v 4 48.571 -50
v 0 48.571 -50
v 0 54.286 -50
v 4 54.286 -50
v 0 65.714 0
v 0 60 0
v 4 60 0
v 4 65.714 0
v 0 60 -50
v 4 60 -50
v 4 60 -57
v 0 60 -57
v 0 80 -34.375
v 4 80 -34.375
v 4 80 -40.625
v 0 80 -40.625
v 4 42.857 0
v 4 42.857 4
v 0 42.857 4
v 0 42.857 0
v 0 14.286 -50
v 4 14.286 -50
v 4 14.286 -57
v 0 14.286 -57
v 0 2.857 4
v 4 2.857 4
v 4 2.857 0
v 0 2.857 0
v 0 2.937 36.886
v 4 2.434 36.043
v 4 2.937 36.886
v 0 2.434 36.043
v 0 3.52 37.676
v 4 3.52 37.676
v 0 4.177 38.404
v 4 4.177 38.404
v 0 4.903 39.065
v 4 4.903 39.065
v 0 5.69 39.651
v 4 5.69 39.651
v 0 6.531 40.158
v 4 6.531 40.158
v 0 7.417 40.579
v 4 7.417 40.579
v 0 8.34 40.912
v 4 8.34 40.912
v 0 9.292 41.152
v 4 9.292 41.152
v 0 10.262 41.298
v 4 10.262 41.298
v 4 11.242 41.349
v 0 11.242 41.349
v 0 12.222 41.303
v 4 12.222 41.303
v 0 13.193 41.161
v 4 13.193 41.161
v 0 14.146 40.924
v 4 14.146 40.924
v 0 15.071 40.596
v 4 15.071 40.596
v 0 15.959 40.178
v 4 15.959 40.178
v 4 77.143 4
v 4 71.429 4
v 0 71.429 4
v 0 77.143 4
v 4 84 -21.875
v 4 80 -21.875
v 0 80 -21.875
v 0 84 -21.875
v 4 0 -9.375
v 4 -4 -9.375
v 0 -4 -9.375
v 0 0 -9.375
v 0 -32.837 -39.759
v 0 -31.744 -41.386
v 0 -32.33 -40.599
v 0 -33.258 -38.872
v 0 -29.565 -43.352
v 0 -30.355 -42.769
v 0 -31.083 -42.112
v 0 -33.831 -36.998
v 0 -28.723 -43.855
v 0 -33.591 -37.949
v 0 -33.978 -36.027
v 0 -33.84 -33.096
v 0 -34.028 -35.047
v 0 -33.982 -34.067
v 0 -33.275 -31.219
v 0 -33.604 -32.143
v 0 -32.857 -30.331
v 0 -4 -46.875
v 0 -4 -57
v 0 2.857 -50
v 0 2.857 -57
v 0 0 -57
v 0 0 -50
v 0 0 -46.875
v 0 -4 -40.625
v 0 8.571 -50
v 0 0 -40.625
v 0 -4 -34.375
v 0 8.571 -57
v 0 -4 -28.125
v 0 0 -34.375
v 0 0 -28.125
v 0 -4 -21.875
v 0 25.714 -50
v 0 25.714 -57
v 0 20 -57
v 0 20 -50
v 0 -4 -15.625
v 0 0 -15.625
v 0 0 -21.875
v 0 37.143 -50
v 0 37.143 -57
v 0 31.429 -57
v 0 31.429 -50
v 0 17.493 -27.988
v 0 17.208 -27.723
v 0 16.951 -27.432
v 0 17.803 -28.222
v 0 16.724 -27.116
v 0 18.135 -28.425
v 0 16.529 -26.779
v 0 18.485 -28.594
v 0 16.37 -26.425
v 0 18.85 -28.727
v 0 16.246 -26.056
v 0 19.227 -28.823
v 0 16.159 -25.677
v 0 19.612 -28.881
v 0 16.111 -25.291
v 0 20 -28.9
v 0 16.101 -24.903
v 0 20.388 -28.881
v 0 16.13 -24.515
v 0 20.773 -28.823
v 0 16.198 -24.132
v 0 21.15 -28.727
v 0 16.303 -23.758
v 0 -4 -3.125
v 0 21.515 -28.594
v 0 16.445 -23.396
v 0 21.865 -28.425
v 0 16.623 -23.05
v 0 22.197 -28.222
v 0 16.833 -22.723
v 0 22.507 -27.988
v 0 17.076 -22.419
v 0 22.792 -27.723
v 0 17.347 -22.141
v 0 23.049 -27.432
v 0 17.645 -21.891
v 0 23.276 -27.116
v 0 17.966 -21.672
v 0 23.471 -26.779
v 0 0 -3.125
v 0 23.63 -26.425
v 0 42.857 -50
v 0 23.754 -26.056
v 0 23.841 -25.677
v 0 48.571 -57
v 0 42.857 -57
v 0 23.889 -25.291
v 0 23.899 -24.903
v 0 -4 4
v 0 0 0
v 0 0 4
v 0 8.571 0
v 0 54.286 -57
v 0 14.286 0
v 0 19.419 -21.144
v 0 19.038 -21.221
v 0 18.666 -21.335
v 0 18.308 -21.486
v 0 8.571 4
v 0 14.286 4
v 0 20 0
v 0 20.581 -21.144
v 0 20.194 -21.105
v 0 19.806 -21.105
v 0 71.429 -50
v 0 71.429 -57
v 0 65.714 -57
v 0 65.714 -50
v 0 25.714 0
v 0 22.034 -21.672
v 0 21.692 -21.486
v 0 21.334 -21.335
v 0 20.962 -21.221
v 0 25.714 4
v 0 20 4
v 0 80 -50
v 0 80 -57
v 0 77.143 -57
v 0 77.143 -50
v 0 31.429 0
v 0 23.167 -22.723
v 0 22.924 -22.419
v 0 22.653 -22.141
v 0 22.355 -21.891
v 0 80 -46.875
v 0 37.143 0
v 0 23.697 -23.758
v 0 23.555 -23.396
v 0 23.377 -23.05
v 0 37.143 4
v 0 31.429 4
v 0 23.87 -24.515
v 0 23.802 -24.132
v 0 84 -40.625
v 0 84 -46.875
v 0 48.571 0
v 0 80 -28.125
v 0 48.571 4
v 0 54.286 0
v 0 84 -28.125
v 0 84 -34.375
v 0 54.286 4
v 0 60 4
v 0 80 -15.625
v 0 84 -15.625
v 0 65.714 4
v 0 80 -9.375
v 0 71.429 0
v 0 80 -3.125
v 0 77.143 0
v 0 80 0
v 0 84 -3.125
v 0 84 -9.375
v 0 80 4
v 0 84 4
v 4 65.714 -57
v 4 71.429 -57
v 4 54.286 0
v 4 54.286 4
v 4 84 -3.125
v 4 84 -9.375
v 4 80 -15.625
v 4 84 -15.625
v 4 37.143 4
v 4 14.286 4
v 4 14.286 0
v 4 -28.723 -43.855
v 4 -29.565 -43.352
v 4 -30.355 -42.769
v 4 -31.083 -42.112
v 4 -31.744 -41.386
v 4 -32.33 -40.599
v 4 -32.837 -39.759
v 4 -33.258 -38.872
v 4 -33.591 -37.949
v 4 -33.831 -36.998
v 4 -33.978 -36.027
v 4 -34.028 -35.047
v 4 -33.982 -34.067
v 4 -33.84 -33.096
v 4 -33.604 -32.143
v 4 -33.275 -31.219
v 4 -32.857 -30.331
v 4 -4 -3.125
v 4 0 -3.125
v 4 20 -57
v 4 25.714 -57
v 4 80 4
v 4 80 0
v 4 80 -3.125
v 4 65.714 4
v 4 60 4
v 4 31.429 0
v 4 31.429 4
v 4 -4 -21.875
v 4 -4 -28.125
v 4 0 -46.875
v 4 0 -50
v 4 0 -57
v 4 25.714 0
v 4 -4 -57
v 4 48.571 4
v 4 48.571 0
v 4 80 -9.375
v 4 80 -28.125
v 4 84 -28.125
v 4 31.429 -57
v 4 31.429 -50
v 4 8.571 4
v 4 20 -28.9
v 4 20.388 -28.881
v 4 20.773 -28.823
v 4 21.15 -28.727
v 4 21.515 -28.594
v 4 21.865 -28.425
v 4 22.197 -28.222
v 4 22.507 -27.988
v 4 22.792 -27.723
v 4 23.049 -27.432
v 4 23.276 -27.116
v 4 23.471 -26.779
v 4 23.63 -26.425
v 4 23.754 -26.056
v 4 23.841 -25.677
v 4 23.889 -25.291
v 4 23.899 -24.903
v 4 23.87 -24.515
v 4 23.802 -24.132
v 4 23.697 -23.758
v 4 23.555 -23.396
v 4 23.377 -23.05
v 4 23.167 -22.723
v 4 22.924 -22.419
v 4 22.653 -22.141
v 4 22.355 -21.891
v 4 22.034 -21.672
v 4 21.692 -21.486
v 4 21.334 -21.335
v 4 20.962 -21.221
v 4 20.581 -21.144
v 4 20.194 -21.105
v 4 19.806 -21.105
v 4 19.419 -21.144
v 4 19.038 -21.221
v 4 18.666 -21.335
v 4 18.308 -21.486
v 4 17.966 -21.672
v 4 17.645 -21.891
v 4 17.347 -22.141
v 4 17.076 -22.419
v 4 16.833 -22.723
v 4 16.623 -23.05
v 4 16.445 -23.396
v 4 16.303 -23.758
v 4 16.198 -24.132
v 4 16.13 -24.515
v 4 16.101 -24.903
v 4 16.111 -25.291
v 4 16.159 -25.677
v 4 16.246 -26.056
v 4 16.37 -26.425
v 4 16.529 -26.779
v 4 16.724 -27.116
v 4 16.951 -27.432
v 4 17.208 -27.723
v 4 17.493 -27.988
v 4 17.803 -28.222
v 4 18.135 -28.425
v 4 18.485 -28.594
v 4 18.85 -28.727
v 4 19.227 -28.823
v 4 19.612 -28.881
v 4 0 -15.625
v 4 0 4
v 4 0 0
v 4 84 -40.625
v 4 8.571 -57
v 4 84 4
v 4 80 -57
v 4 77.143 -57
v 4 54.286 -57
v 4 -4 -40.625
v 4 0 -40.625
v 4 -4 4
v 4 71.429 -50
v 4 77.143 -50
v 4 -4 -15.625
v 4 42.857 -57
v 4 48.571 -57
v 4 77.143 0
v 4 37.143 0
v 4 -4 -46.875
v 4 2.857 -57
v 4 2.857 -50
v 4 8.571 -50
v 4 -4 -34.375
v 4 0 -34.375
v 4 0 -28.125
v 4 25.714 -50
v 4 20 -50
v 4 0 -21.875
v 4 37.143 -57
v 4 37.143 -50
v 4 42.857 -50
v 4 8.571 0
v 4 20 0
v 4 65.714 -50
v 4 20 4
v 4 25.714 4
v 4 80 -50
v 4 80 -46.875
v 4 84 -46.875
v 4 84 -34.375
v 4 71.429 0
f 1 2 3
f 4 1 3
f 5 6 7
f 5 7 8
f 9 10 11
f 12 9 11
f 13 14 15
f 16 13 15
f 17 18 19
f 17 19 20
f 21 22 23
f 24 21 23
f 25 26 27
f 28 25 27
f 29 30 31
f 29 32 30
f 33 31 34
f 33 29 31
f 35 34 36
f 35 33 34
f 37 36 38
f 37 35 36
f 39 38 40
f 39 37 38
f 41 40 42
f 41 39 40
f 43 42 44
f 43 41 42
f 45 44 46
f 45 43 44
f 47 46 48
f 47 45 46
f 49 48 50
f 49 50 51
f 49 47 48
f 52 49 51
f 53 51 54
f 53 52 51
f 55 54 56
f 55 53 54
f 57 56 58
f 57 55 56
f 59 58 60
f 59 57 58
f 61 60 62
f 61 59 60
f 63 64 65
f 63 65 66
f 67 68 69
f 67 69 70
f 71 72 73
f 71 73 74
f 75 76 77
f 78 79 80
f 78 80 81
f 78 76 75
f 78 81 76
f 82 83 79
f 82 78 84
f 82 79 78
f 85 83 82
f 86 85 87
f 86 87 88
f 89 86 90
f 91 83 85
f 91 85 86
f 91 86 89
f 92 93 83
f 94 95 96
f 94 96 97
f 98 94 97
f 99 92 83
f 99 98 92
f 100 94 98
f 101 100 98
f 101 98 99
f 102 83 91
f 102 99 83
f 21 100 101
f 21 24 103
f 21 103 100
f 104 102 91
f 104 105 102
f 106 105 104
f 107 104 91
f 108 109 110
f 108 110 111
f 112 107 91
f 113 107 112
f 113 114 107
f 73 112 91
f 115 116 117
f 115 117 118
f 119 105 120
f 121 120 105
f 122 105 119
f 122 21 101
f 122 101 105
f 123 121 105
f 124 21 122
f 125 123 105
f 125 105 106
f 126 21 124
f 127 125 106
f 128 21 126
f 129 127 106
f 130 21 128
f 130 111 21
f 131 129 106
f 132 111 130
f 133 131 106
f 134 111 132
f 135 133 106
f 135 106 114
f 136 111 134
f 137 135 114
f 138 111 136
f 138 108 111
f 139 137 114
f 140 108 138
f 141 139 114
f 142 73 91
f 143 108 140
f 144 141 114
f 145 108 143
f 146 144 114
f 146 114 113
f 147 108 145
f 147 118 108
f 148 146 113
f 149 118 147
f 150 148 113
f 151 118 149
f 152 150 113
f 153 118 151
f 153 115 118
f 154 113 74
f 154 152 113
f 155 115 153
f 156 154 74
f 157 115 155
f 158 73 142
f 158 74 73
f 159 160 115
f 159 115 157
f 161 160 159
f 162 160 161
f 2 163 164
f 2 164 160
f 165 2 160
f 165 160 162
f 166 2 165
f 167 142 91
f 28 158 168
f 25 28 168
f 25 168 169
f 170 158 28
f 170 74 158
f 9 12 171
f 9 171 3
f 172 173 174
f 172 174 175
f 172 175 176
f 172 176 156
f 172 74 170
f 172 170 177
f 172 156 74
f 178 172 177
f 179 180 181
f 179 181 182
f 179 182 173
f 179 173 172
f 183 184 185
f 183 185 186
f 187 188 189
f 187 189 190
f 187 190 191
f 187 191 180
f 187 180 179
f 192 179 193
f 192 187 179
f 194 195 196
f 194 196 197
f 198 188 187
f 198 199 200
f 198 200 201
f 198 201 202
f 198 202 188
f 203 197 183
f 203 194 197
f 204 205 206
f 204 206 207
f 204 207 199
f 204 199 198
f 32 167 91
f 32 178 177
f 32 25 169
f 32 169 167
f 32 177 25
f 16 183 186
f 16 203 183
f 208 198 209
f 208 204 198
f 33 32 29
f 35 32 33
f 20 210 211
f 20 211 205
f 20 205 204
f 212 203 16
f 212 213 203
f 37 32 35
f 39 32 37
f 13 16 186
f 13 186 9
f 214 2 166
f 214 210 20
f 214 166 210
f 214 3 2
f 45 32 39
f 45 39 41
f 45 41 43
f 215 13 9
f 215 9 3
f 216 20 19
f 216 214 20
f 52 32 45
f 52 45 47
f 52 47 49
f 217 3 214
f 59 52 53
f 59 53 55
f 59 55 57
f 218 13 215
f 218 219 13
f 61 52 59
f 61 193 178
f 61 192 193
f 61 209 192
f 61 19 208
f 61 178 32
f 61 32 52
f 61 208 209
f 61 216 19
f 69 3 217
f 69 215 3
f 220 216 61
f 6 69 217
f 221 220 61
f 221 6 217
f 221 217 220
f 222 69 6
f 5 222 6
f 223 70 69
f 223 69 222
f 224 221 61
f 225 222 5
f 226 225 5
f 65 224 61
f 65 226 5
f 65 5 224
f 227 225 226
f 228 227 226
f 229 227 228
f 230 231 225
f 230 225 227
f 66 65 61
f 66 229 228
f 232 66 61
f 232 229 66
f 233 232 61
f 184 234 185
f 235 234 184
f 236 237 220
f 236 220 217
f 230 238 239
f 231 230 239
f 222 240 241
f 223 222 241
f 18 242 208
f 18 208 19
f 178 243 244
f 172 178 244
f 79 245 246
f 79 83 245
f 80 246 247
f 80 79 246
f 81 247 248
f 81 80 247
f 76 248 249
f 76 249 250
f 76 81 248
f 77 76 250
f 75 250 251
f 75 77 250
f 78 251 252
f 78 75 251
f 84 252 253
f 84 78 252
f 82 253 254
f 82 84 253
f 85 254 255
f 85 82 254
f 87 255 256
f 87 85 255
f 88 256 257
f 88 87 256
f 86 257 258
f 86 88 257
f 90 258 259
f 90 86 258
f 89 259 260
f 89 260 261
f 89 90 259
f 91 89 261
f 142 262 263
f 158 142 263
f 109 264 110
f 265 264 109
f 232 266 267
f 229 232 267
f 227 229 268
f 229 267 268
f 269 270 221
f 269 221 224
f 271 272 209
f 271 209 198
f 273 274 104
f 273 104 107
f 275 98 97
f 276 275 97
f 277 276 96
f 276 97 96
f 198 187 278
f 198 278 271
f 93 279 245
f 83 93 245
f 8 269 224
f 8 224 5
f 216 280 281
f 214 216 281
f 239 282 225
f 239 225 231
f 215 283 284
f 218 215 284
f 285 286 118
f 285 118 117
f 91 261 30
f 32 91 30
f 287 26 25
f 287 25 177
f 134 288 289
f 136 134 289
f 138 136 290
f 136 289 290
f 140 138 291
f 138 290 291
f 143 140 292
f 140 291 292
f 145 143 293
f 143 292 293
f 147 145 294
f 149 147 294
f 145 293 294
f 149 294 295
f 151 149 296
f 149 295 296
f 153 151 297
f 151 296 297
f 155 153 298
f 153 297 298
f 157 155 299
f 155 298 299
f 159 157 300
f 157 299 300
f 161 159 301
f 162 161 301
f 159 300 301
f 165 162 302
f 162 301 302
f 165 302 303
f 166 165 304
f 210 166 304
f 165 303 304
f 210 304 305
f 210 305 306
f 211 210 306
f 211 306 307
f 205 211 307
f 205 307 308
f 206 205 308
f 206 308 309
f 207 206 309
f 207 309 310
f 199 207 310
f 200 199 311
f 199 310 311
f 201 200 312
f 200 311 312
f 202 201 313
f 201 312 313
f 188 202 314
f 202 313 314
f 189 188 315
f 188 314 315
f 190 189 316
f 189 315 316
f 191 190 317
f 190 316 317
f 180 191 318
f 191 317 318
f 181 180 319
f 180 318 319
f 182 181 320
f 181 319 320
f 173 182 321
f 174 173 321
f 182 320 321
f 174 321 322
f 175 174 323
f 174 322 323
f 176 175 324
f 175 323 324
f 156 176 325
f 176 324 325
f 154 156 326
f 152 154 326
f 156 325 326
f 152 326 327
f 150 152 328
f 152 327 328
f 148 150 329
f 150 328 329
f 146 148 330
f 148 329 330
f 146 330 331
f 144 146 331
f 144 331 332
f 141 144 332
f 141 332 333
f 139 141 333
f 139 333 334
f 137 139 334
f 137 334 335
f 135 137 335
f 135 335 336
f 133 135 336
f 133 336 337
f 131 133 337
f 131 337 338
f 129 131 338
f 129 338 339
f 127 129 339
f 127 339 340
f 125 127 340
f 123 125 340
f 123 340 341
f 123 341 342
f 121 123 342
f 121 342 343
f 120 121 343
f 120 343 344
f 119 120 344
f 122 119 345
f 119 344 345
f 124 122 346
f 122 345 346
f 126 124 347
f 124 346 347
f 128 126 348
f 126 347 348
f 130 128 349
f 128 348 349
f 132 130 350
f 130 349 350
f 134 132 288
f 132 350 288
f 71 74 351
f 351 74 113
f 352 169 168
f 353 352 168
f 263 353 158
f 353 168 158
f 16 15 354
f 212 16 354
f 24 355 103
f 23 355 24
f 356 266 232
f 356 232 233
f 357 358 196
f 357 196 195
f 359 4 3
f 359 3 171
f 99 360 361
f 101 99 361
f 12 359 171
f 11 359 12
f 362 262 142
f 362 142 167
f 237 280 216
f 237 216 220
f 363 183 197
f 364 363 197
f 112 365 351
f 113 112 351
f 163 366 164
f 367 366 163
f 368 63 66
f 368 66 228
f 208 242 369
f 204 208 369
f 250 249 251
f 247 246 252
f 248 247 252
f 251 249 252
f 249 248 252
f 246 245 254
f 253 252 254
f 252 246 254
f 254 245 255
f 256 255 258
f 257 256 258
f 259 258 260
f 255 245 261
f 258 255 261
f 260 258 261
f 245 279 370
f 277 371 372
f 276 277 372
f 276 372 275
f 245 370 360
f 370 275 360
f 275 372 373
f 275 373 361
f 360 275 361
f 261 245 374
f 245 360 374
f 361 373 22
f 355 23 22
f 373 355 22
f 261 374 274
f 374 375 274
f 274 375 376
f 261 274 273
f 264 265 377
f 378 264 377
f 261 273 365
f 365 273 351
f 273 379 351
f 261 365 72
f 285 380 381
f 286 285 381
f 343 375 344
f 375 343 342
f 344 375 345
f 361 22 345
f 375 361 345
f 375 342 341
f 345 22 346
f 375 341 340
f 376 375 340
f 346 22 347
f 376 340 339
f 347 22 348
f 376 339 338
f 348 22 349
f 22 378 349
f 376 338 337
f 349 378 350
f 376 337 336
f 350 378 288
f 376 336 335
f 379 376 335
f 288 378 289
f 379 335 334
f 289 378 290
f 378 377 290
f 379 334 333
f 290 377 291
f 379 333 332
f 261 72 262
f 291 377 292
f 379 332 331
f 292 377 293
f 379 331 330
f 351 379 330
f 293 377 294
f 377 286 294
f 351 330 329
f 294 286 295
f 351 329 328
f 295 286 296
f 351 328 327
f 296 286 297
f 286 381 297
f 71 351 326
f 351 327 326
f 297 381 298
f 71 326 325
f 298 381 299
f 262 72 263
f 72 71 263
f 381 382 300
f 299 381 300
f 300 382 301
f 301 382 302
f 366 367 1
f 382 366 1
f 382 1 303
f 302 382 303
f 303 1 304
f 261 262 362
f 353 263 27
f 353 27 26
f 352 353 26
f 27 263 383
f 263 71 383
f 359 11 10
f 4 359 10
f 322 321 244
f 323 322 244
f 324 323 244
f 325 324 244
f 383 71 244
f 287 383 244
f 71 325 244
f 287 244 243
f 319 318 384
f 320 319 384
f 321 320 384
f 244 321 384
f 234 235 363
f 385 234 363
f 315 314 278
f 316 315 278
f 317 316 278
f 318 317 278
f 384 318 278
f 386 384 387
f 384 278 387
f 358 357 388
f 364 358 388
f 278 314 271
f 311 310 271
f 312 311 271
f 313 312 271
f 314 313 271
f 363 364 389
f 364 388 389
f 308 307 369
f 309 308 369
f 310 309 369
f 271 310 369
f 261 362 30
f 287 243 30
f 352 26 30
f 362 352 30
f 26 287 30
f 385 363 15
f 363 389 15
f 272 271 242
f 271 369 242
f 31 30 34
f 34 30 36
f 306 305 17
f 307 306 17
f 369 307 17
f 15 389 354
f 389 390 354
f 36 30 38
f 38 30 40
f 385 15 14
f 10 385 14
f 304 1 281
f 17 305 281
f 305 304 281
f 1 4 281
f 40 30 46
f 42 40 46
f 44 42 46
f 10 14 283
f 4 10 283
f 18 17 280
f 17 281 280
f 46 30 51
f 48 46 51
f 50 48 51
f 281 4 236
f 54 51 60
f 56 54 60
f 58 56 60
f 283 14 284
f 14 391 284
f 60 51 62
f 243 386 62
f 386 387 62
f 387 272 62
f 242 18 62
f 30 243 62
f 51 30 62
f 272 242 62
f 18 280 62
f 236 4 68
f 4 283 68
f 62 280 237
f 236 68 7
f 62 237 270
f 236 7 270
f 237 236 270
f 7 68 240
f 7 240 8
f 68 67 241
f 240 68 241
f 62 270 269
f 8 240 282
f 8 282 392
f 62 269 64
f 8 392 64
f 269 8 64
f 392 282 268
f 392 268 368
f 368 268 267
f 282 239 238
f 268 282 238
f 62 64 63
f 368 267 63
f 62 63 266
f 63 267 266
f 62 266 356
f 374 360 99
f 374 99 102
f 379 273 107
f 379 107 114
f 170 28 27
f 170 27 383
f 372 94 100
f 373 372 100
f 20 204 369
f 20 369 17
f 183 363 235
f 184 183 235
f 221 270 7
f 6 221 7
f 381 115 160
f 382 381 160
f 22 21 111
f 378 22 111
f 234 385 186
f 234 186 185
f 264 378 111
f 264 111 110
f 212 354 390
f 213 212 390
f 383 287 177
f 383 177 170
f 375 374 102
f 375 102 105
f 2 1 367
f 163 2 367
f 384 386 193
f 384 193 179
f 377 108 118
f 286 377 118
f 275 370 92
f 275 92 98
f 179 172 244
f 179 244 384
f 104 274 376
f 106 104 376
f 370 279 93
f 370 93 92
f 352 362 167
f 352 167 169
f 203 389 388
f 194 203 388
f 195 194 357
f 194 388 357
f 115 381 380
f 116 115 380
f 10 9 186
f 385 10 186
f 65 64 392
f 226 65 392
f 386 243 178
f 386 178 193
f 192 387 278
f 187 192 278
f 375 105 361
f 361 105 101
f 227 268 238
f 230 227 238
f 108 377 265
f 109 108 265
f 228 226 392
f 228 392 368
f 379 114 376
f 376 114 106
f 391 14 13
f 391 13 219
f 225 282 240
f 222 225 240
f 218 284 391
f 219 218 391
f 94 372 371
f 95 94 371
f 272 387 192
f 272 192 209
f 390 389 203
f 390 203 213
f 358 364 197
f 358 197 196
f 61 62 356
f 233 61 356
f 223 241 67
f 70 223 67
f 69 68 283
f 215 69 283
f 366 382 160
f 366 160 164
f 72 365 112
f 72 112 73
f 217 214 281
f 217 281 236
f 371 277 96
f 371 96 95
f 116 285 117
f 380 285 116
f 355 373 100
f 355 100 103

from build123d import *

# Parameters (mm, degrees)
SCHIZZO1_W                   = 50
SCHIZZO1_H                   = 80
ESTRUSIONE_ESTRUSIONE1_DEPTH = 4
SCHIZZO2_W                   = 4
SCHIZZO2_H                   = 2.857142857
SCHIZZO2_W_2                 = 7
ESTRUSIONE_ESTRUSIONE2_DEPTH = 4
SCHIZZO3_W                   = 4
SCHIZZO3_H                   = 5.714285715
SCHIZZO3_W_2                 = 7
ESTRUSIONE_ESTRUSIONE3_DEPTH = 4
RIPETIZIONE_A_L1_COUNT       = 6
RIPETIZIONE_A_L1_PITCH       = 11.428571
SCHIZZO4_W                   = 6.25
SCHIZZO4_H                   = 4
ESTRUSIONE_ESTRUSIONE4_DEPTH = 4
RIPETIZIONE_A_L2_COUNT       = 4
RIPETIZIONE_A_L2_PITCH       = 12.5
ESTRUSIONE_ESTRUSIONE5_DEPTH = 4
RACCORDO1_R                  = 10
SCHIZZO6_R                   = 3.9
TAGLIO_ESTRUSIONE1_DEPTH     = 4


with BuildPart() as part:
    # Schizzo1 → Estrusione-Estrusione1 (new body)
    with BuildSketch(Plane(origin=(0, 0, 0), x_dir=(0, 0, -1), z_dir=(1, 0, 0))):
        with Locations((25, 40)):
            Rectangle(SCHIZZO1_W, SCHIZZO1_H)
    extrude(amount=ESTRUSIONE_ESTRUSIONE1_DEPTH)

    # Schizzo2 → Estrusione-Estrusione2 (add)
    with BuildSketch(Plane(origin=(4, 0, 0), x_dir=(0, 0, -1), z_dir=(1, 0, 0))):
        with Locations((-2, 78.571428572)):
            Rectangle(SCHIZZO2_W, SCHIZZO2_H)
        with Locations((53.5, 78.571428572)):
            Rectangle(SCHIZZO2_W_2, SCHIZZO2_H)
        with Locations((53.5, 1.428571429)):
            Rectangle(SCHIZZO2_W_2, SCHIZZO2_H)
        with Locations((-2, 1.428571429)):
            Rectangle(SCHIZZO2_W, SCHIZZO2_H)
    extrude(amount=-ESTRUSIONE_ESTRUSIONE2_DEPTH)

    # Schizzo3 → Estrusione-Estrusione3 (add)
    with BuildSketch(Plane(origin=(4, 0, 0), x_dir=(0, 0, -1), z_dir=(1, 0, 0))):
        with Locations((-2, 68.571428572)):
            Rectangle(SCHIZZO3_W, SCHIZZO3_H)
        with Locations((53.5, 68.571428572)):
            Rectangle(SCHIZZO3_W_2, SCHIZZO3_H)
    estrusione_estrusione3 = extrude(amount=-ESTRUSIONE_ESTRUSIONE3_DEPTH)

    # Ripetizione a L1: Estrusione-Estrusione3 ×6
    with Locations(*[(0, -i * RIPETIZIONE_A_L1_PITCH, 0) for i in range(1, RIPETIZIONE_A_L1_COUNT)]):
        add(estrusione_estrusione3)

    # Schizzo4 → Estrusione-Estrusione4 (add)
    with BuildSketch(Plane(origin=(4, 0, 0), x_dir=(0, 0, -1), z_dir=(1, 0, 0))):
        with Locations((6.25, 82)):
            Rectangle(SCHIZZO4_W, SCHIZZO4_H)
        with Locations((6.25, -2)):
            Rectangle(SCHIZZO4_W, SCHIZZO4_H)
    estrusione_estrusione4 = extrude(amount=-ESTRUSIONE_ESTRUSIONE4_DEPTH)

    # Ripetizione a L2: Estrusione-Estrusione4 ×4
    with Locations(*[(0, 0, -i * RIPETIZIONE_A_L2_PITCH) for i in range(1, RIPETIZIONE_A_L2_COUNT)]):
        add(estrusione_estrusione4)

    # Schizzo5 → Estrusione-Estrusione5 (add)
    with BuildSketch(Plane(origin=(4, 0, 0), x_dir=(0, 0, -1), z_dir=(1, 0, 0))):
        Polygon((46.875, -4), (57, -4), (39.160080614, -37.552008529), (-44.872956134, 7.129149682), (-4, 84), (-4, 80), (-4, -4), align=None)
    extrude(amount=-ESTRUSIONE_ESTRUSIONE5_DEPTH)

    # Raccordo1
    raccordo1_edges = [part.edges().sort_by_distance(p)[0] for p in [
        (2, -37.552008529, -39.160080614),
        (2, 7.129149682, 44.872956134),
    ]]
    fillet(raccordo1_edges, radius=RACCORDO1_R)

    # Schizzo6 → Taglio-Estrusione1 (cut)
    with BuildSketch(Plane(origin=(4, 0, 0), x_dir=(0, 0, -1), z_dir=(1, 0, 0))):
        with Locations((25, 20)):
            Circle(SCHIZZO6_R)
    extrude(amount=-TAGLIO_ESTRUSIONE1_DEPTH, mode=Mode.SUBTRACT)


solid = part.part
